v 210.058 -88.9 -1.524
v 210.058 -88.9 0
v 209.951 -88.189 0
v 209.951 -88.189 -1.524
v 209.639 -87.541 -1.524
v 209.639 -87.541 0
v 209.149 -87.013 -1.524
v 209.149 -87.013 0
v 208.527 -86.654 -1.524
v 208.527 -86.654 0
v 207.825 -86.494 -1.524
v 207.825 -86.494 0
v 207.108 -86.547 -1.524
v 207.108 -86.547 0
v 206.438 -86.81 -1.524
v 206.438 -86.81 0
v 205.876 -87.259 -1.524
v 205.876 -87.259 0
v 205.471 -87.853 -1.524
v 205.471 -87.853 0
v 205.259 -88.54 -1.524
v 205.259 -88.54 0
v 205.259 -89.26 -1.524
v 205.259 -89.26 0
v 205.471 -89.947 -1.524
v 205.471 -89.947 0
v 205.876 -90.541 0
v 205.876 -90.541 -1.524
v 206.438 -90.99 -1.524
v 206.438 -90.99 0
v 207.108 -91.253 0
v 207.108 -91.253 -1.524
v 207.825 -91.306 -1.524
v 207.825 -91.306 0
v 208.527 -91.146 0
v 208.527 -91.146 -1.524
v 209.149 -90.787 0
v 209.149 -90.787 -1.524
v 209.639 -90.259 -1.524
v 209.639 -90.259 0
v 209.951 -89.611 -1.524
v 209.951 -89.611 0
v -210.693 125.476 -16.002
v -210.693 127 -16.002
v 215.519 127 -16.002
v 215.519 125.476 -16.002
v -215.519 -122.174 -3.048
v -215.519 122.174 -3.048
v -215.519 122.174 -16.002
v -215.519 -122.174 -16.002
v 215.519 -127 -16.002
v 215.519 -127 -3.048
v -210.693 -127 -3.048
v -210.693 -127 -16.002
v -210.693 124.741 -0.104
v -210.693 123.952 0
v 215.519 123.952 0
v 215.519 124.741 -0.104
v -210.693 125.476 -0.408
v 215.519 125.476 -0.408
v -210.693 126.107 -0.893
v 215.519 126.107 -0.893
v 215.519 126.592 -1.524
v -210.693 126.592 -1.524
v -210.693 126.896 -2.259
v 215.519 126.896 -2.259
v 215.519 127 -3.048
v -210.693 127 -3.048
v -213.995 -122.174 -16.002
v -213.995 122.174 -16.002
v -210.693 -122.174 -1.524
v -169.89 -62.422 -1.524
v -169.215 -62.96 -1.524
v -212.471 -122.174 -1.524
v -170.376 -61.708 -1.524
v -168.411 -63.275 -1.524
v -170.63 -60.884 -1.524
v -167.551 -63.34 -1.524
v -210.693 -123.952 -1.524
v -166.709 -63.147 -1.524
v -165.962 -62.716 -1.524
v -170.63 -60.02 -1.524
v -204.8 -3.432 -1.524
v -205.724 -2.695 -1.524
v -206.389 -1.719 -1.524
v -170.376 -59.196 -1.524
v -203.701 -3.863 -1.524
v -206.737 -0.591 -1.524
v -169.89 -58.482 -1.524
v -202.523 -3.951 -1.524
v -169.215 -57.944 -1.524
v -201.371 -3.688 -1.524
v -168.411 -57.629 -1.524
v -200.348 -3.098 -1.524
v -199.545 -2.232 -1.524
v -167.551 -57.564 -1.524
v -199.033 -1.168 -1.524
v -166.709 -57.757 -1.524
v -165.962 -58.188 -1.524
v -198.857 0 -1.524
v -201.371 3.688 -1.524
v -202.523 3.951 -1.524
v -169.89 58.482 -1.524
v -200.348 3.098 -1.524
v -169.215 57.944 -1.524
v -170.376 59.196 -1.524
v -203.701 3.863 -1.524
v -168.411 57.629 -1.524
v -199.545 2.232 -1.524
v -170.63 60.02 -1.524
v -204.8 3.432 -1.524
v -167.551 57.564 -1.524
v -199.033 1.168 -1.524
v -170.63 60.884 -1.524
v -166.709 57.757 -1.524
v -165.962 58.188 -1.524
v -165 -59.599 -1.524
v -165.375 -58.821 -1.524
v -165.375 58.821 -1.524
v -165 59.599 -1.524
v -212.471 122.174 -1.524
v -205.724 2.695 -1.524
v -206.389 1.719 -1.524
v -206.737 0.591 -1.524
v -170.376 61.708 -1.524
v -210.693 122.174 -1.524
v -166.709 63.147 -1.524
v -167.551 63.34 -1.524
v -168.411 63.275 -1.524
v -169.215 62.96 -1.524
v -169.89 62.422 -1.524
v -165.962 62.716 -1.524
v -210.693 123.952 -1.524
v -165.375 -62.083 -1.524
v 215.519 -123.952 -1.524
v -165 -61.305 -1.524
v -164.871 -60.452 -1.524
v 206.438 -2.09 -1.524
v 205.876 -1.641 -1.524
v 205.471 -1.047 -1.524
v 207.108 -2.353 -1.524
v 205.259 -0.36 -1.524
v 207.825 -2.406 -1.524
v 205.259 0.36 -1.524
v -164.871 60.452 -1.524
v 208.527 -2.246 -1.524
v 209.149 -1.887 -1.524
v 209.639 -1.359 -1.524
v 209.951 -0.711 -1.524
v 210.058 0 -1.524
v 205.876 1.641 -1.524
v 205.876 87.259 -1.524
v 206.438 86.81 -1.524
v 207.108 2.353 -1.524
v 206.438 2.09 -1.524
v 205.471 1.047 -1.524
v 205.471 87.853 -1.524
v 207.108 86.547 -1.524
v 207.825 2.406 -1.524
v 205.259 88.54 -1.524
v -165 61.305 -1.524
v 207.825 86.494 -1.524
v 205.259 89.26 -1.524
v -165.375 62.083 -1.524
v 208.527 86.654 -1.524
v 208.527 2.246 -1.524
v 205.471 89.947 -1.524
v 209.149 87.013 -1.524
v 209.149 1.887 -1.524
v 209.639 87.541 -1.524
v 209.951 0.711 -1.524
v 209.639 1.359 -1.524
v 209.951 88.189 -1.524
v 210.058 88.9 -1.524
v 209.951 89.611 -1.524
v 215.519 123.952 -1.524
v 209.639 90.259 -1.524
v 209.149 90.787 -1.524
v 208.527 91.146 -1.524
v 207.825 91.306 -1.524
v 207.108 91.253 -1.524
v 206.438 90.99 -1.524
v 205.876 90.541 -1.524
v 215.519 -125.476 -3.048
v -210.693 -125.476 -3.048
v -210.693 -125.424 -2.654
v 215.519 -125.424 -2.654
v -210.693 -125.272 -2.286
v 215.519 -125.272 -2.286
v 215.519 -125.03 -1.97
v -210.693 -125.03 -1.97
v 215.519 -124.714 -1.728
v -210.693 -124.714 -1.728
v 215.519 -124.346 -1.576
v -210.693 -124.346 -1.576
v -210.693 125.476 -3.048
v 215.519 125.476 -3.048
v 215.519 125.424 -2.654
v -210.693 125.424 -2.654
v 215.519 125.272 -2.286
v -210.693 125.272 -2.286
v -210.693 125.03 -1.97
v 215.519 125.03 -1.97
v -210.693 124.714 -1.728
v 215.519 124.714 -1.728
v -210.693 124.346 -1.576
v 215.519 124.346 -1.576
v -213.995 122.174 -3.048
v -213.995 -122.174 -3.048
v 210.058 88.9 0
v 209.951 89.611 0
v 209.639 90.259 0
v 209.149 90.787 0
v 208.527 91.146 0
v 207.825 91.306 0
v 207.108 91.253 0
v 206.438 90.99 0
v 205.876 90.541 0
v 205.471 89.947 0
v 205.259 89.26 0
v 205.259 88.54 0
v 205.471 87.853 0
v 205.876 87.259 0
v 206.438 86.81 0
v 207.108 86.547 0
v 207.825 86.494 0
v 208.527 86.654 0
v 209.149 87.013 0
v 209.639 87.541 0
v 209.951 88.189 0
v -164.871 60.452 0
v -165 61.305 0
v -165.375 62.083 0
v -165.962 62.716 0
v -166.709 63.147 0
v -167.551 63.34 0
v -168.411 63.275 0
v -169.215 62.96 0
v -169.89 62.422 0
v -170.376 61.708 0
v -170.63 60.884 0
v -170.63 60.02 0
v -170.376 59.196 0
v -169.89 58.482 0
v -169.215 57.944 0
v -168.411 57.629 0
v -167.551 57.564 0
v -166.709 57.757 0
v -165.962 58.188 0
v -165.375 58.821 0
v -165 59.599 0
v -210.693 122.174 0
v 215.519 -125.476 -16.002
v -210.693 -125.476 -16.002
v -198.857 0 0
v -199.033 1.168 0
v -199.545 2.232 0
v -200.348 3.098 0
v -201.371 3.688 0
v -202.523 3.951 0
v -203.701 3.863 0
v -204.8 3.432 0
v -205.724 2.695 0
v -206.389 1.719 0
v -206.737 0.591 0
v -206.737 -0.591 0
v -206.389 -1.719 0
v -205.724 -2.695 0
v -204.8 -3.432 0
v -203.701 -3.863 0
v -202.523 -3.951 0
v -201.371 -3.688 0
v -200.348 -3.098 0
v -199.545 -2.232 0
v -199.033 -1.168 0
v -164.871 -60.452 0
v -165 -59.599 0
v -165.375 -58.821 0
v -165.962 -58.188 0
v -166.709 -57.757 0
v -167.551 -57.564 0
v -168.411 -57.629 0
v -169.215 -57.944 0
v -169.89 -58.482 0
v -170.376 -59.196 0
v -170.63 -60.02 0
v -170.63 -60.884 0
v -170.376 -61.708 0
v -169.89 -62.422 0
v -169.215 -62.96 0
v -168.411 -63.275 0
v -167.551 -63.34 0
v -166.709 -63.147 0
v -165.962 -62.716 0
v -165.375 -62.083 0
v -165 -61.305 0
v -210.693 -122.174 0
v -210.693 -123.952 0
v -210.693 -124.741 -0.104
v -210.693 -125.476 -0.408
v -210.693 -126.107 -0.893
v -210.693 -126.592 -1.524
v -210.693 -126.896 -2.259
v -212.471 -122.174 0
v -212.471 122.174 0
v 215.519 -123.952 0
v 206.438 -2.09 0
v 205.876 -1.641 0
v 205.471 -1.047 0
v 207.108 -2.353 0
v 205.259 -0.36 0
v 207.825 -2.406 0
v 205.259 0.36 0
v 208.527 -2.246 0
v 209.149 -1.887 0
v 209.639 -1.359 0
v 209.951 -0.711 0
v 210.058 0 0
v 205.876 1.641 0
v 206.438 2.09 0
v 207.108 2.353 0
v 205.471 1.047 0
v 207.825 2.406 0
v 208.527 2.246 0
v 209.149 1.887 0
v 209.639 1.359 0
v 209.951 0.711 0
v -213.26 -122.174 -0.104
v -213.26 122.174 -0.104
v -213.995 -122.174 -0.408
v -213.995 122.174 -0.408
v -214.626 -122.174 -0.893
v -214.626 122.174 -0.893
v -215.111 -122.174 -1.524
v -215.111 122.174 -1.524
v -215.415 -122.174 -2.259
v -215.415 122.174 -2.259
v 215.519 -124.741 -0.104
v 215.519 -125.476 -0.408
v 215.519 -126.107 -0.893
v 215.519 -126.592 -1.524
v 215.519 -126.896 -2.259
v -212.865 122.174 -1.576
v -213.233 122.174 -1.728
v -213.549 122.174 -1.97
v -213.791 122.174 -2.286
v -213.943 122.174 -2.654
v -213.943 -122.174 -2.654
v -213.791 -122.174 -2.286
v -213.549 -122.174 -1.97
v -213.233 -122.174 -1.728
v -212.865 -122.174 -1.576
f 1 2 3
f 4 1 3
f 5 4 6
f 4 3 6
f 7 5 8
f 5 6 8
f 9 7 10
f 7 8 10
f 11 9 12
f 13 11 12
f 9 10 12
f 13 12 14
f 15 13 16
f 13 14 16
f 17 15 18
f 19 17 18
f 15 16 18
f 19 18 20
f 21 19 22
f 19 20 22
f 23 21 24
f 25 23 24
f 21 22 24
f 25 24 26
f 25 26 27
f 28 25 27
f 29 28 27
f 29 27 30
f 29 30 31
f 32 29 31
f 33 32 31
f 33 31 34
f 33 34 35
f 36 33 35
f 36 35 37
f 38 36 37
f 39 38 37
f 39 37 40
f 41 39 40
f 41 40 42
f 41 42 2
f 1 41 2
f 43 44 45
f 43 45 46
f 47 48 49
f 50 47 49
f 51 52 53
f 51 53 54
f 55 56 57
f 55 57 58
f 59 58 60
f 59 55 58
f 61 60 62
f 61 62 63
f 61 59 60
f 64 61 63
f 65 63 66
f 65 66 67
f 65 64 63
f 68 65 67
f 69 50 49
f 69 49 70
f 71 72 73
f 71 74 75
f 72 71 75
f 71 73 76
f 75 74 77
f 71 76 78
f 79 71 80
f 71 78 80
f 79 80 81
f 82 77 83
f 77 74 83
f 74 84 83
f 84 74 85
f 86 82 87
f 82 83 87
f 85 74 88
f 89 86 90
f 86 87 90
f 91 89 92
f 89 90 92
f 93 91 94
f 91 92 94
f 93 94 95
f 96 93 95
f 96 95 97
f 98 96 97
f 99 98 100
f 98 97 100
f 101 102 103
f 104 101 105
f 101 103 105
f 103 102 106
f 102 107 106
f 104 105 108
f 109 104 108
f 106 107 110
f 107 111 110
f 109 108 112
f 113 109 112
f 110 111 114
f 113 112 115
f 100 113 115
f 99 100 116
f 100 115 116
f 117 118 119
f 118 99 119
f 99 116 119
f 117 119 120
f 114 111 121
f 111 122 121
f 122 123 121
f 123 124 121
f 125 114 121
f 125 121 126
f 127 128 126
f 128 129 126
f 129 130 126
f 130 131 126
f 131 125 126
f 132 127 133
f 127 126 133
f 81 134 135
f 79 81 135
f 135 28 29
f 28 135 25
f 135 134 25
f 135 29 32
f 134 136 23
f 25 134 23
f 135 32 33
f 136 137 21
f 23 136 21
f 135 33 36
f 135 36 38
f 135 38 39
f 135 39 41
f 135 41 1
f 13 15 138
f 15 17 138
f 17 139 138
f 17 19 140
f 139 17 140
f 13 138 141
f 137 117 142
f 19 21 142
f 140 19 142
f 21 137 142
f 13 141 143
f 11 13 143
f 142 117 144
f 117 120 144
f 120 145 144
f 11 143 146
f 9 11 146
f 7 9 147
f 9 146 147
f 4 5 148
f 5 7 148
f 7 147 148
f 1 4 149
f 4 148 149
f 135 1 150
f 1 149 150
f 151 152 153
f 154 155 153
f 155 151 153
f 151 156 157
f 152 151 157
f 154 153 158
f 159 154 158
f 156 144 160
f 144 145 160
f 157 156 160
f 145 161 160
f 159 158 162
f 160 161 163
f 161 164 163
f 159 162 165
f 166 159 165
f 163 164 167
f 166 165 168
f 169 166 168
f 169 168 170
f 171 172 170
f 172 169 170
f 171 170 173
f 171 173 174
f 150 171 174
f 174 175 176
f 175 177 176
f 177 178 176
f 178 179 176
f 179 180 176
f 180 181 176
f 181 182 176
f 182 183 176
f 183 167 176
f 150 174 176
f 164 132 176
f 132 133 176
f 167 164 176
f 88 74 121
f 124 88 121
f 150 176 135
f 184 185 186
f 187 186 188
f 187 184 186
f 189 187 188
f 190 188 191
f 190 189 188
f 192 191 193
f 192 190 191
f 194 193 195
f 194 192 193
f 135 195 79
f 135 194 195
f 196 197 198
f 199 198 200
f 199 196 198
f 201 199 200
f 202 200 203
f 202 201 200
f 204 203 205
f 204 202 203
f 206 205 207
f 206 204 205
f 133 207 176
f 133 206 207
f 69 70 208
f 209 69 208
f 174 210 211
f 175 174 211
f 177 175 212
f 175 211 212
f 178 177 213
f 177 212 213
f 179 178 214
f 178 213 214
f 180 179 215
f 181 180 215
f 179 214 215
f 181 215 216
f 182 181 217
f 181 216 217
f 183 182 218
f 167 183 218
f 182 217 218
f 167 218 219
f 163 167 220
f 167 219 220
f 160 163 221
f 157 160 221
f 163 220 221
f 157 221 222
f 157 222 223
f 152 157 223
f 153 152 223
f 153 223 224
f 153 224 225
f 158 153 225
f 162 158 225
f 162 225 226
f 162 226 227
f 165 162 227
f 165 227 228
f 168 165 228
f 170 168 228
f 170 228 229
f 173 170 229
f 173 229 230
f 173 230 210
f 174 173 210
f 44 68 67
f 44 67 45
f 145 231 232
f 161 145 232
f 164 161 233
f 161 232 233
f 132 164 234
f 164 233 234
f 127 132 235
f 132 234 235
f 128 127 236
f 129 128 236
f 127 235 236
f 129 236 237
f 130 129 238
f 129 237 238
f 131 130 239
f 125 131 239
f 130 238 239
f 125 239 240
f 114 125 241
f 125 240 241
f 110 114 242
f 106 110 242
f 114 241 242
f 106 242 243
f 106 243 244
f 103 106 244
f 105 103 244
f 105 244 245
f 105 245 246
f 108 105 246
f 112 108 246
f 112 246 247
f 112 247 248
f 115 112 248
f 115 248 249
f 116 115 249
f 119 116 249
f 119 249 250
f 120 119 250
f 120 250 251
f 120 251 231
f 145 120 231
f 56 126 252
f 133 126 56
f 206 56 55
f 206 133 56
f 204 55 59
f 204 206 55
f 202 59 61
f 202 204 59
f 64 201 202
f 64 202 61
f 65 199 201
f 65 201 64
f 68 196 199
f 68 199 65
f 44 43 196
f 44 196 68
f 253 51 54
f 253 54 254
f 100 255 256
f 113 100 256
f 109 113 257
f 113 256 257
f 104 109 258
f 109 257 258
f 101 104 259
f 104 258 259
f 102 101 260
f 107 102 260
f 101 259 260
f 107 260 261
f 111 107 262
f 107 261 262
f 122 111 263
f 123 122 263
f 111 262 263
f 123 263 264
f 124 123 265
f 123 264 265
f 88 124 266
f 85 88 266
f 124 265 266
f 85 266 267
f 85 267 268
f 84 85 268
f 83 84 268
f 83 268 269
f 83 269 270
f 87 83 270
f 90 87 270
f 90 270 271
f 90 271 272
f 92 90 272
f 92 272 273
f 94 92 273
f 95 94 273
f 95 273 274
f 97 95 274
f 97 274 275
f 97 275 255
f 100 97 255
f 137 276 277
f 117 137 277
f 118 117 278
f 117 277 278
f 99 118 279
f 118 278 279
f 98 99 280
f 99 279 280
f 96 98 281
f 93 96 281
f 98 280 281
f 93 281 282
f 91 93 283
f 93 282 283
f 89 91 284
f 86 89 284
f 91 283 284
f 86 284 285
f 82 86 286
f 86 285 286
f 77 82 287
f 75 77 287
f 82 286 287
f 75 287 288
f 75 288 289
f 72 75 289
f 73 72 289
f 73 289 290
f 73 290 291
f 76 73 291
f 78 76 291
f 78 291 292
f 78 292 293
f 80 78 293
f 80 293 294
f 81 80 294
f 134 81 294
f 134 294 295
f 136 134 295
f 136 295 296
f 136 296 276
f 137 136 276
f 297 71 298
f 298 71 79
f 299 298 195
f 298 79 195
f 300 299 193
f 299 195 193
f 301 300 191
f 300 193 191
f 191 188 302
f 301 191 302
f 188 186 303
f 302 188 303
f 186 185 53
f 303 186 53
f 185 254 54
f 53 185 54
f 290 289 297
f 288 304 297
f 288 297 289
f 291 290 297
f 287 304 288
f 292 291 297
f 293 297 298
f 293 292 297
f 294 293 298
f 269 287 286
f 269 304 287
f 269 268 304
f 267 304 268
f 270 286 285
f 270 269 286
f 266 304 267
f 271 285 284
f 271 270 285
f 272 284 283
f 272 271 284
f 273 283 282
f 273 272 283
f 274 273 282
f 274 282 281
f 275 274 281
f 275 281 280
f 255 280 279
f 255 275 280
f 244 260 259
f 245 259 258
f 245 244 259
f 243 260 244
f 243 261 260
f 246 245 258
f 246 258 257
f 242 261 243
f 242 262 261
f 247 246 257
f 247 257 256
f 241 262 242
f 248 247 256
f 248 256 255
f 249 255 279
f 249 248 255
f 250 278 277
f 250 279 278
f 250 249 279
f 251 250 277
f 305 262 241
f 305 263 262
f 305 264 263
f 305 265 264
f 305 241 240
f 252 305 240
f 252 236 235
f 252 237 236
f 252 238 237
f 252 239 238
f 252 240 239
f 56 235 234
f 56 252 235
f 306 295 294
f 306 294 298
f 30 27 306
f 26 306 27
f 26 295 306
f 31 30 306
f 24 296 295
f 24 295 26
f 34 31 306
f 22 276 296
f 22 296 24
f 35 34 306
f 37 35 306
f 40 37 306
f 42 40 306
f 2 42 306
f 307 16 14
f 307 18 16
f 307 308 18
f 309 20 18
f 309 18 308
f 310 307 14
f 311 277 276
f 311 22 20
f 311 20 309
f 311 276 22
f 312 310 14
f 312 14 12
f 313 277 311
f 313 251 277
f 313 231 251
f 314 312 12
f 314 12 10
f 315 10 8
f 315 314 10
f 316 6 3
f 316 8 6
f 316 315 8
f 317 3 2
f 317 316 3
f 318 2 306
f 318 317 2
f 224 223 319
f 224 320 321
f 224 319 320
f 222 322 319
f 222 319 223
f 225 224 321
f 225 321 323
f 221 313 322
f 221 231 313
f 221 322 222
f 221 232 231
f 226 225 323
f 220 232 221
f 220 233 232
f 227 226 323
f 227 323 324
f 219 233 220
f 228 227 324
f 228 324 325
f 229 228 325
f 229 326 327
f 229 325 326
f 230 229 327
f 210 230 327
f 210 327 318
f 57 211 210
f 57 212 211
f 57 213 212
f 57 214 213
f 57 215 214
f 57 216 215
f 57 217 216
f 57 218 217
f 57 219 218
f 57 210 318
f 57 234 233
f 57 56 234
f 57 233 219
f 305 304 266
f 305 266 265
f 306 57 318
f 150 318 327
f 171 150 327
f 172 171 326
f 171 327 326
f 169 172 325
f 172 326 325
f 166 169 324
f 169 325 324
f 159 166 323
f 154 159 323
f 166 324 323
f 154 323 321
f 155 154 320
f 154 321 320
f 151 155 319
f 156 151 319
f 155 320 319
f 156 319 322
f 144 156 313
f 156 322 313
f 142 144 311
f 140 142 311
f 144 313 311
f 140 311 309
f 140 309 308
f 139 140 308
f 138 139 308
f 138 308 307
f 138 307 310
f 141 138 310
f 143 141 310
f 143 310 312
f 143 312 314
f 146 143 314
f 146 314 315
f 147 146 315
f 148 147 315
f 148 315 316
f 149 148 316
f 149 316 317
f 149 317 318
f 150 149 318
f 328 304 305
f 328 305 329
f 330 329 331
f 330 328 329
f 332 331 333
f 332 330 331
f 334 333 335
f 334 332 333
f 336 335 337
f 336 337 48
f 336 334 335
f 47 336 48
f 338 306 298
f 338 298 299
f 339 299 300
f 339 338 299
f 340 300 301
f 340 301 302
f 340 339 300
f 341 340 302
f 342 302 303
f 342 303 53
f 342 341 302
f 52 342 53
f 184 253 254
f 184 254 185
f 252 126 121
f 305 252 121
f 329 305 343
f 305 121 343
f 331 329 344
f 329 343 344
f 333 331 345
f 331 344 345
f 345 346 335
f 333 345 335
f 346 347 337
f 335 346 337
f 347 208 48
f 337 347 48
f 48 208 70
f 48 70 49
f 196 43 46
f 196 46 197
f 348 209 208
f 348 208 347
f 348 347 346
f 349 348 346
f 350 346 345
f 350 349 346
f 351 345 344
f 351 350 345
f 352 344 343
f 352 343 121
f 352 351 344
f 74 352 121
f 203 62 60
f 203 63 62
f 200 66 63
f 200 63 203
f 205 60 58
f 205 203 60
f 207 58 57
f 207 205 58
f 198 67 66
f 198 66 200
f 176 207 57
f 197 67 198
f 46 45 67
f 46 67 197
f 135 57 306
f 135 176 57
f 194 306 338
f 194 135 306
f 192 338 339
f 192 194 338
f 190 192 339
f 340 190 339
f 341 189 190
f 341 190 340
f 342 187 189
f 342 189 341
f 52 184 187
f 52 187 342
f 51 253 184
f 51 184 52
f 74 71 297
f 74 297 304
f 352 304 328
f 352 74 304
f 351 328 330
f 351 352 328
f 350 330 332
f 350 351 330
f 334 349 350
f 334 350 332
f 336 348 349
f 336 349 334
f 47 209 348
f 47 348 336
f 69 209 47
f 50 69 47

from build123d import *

# Parameters (mm, degrees)
CROQUIS1_W                         = 431.038
CROQUIS1_H                         = 254
BRIDA_BASE1_DEPTH                  = 1.524
CORTAR_EXTRUIR1_REACH              = 252.159
CROQUIS6_W                         = 4.826
CROQUIS6_H                         = 4.826
BRIDA_DE_ARISTA1_STRIP_W           = 9.144
BRIDA_DE_ARISTA1_STRIP_H           = 1.524
BRIDA_DE_ARISTA1_STRIP_CUT_DEPTH   = 426.212
BRIDA_DE_ARISTA1_STRIP_2_W         = 9.144
BRIDA_DE_ARISTA1_STRIP_2_H         = 1.524
BRIDA_DE_ARISTA1_STRIP_CUT_2_DEPTH = 426.212
BRIDA_DE_ARISTA1_STRIP_3_W         = 9.144
BRIDA_DE_ARISTA1_STRIP_3_H         = 1.524
BRIDA_DE_ARISTA1_STRIP_CUT_3_DEPTH = 244.348
BRIDA_DE_ARISTA1_DEPTH             = 426.212
BRIDA_DE_ARISTA1_BEND_DEPTH        = 426.212
BRIDA_DE_ARISTA1_BEND_2_DEPTH      = 244.348
CORTAR_EXTRUIR2_REACH              = 252.666
CROQUIS16_R                        = 3.9624
CROQUIS16_R_2                      = 2.8956
CROQUIS16_R_3                      = 2.413


# Sheet-metal steps are written as plain solids
with BuildPart() as part:
    # Croquis1 → Brida base1 (new body)
    with BuildSketch(Plane.XY):
        Rectangle(CROQUIS1_W, CROQUIS1_H)
    extrude(amount=-BRIDA_BASE1_DEPTH)

    # Croquis6 → Cortar-Extruir1 (cut, up to next)
    with BuildSketch(Plane.XY, mode=Mode.PRIVATE) as cortar_extruir1_sk1:
        with Locations((-213.106, 124.587)):
            Rectangle(CROQUIS6_W, CROQUIS6_H)
    cortar_extruir1_tool1 = extrude(cortar_extruir1_sk1.sketch, amount=-CORTAR_EXTRUIR1_REACH, mode=Mode.PRIVATE) & part.part
    # Croquis6 → Cortar-Extruir1 (cut, up to next)
    with BuildSketch(Plane.XY, mode=Mode.PRIVATE) as cortar_extruir1_sk2:
        with Locations((-213.106, -124.587)):
            Rectangle(CROQUIS6_W, CROQUIS6_H)
    cortar_extruir1_tool2 = extrude(cortar_extruir1_sk2.sketch, amount=-CORTAR_EXTRUIR1_REACH, mode=Mode.PRIVATE) & part.part
    add(cortar_extruir1_tool1.solids().sort_by_distance((-213.106, 124.587, 0))[0], mode=Mode.SUBTRACT)
    add(cortar_extruir1_tool2.solids().sort_by_distance((-213.106, -124.587, 0))[0], mode=Mode.SUBTRACT)

    # Brida de arista1 strip (across the edge) → Brida de arista1 strip cut (cut)
    with BuildSketch(Plane(origin=(-210.693, 127, -1.524), x_dir=(0, -1, 0), z_dir=(1, 0, 0))):
        with Locations((-1.524, -0.762)):
            Rectangle(BRIDA_DE_ARISTA1_STRIP_W, BRIDA_DE_ARISTA1_STRIP_H)
    extrude(amount=BRIDA_DE_ARISTA1_STRIP_CUT_DEPTH, mode=Mode.SUBTRACT)

    # Brida de arista1 strip 2 (across the edge) → Brida de arista1 strip cut 2 (cut)
    with BuildSketch(Plane(origin=(215.519, -127, -1.524), x_dir=(0, 1, 0), z_dir=(-1, 0, 0))):
        with Locations((-1.524, -0.762)):
            Rectangle(BRIDA_DE_ARISTA1_STRIP_2_W, BRIDA_DE_ARISTA1_STRIP_2_H)
    extrude(amount=BRIDA_DE_ARISTA1_STRIP_CUT_2_DEPTH, mode=Mode.SUBTRACT)

    # Brida de arista1 strip 3 (across the edge) → Brida de arista1 strip cut 3 (cut)
    with BuildSketch(Plane(origin=(-215.519, -122.174, -1.524), x_dir=(1, 0, 0), z_dir=(0, 1, 0))):
        with Locations((-1.524, -0.762)):
            Rectangle(BRIDA_DE_ARISTA1_STRIP_3_W, BRIDA_DE_ARISTA1_STRIP_3_H)
    extrude(amount=BRIDA_DE_ARISTA1_STRIP_CUT_3_DEPTH, mode=Mode.SUBTRACT)

    # Brida de arista1 section (across the edge) → Brida de arista1 (add)
    with BuildSketch(Plane(origin=(-210.693, 127, -1.524), x_dir=(0, -1, 0), z_dir=(1, 0, 0))):
        with BuildLine():
            Line((0, 1.524), (0, 14.478))
            Line((0, 14.478), (1.524, 14.478))
            Line((1.524, 14.478), (1.524, 1.524))
            ThreePointArc((1.524, 1.524), (1.970369265, 0.446369265), (3.048, 0))
            Line((3.048, 0), (3.048, -1.524))
            ThreePointArc((3.048, -1.524), (0.892738531, -0.631261469), (0, 1.524))
        make_face()
    extrude(amount=BRIDA_DE_ARISTA1_DEPTH)

    # Brida de arista1 section 2 (across the edge) → Brida de arista1 bend (add)
    with BuildSketch(Plane(origin=(215.519, -127, -1.524), x_dir=(0, 1, 0), z_dir=(-1, 0, 0))):
        with BuildLine():
            Line((0, 1.524), (0, 14.478))
            Line((0, 14.478), (1.524, 14.478))
            Line((1.524, 14.478), (1.524, 1.524))
            ThreePointArc((1.524, 1.524), (1.970369265, 0.446369265), (3.048, 0))
            Line((3.048, 0), (3.048, -1.524))
            ThreePointArc((3.048, -1.524), (0.892738531, -0.631261469), (0, 1.524))
        make_face()
    extrude(amount=BRIDA_DE_ARISTA1_BEND_DEPTH)

    # Brida de arista1 section 3 (across the edge) → Brida de arista1 bend 2 (add)
    with BuildSketch(Plane(origin=(-215.519, -122.174, -1.524), x_dir=(1, 0, 0), z_dir=(0, 1, 0))):
        with BuildLine():
            Line((0, 1.524), (0, 14.478))
            Line((0, 14.478), (1.524, 14.478))
            Line((1.524, 14.478), (1.524, 1.524))
            ThreePointArc((1.524, 1.524), (1.970369265, 0.446369265), (3.048, 0))
            Line((3.048, 0), (3.048, -1.524))
            ThreePointArc((3.048, -1.524), (0.892738531, -0.631261469), (0, 1.524))
        make_face()
    extrude(amount=BRIDA_DE_ARISTA1_BEND_2_DEPTH)

    # Croquis16 → Cortar-Extruir2 (cut, up to next)
    with BuildSketch(Plane.XY, mode=Mode.PRIVATE) as cortar_extruir2_sk1:
        with Locations((-202.819, 0)):
            Circle(CROQUIS16_R)
    cortar_extruir2_tool1 = extrude(cortar_extruir2_sk1.sketch, amount=-CORTAR_EXTRUIR2_REACH, mode=Mode.PRIVATE) & part.part
    # Croquis16 → Cortar-Extruir2 (cut, up to next)
    with BuildSketch(Plane.XY, mode=Mode.PRIVATE) as cortar_extruir2_sk2:
        with Locations((-167.767, 60.452)):
            Circle(CROQUIS16_R_2)
    cortar_extruir2_tool2 = extrude(cortar_extruir2_sk2.sketch, amount=-CORTAR_EXTRUIR2_REACH, mode=Mode.PRIVATE) & part.part
    # Croquis16 → Cortar-Extruir2 (cut, up to next)
    with BuildSketch(Plane.XY, mode=Mode.PRIVATE) as cortar_extruir2_sk3:
        with Locations((-167.767, -60.452)):
            Circle(CROQUIS16_R_2)
    cortar_extruir2_tool3 = extrude(cortar_extruir2_sk3.sketch, amount=-CORTAR_EXTRUIR2_REACH, mode=Mode.PRIVATE) & part.part
    # Croquis16 → Cortar-Extruir2 (cut, up to next)
    with BuildSketch(Plane.XY, mode=Mode.PRIVATE) as cortar_extruir2_sk4:
        with Locations((207.645, 88.9)):
            Circle(CROQUIS16_R_3)
    cortar_extruir2_tool4 = extrude(cortar_extruir2_sk4.sketch, amount=-CORTAR_EXTRUIR2_REACH, mode=Mode.PRIVATE) & part.part
    # Croquis16 → Cortar-Extruir2 (cut, up to next)
    with BuildSketch(Plane.XY, mode=Mode.PRIVATE) as cortar_extruir2_sk5:
        with Locations((207.645, 0)):
            Circle(CROQUIS16_R_3)
    cortar_extruir2_tool5 = extrude(cortar_extruir2_sk5.sketch, amount=-CORTAR_EXTRUIR2_REACH, mode=Mode.PRIVATE) & part.part
    # Croquis16 → Cortar-Extruir2 (cut, up to next)
    with BuildSketch(Plane.XY, mode=Mode.PRIVATE) as cortar_extruir2_sk6:
        with Locations((207.645, -88.9)):
            Circle(CROQUIS16_R_3)
    cortar_extruir2_tool6 = extrude(cortar_extruir2_sk6.sketch, amount=-CORTAR_EXTRUIR2_REACH, mode=Mode.PRIVATE) & part.part
    add(cortar_extruir2_tool1.solids().sort_by_distance((-202.819, 0, 0))[0], mode=Mode.SUBTRACT)
    add(cortar_extruir2_tool2.solids().sort_by_distance((-167.767, 60.452, 0))[0], mode=Mode.SUBTRACT)
    add(cortar_extruir2_tool3.solids().sort_by_distance((-167.767, -60.452, 0))[0], mode=Mode.SUBTRACT)
    add(cortar_extruir2_tool4.solids().sort_by_distance((207.645, 88.9, 0))[0], mode=Mode.SUBTRACT)
    add(cortar_extruir2_tool5.solids().sort_by_distance((207.645, 0, 0))[0], mode=Mode.SUBTRACT)
    add(cortar_extruir2_tool6.solids().sort_by_distance((207.645, -88.9, 0))[0], mode=Mode.SUBTRACT)


solid = part.part
